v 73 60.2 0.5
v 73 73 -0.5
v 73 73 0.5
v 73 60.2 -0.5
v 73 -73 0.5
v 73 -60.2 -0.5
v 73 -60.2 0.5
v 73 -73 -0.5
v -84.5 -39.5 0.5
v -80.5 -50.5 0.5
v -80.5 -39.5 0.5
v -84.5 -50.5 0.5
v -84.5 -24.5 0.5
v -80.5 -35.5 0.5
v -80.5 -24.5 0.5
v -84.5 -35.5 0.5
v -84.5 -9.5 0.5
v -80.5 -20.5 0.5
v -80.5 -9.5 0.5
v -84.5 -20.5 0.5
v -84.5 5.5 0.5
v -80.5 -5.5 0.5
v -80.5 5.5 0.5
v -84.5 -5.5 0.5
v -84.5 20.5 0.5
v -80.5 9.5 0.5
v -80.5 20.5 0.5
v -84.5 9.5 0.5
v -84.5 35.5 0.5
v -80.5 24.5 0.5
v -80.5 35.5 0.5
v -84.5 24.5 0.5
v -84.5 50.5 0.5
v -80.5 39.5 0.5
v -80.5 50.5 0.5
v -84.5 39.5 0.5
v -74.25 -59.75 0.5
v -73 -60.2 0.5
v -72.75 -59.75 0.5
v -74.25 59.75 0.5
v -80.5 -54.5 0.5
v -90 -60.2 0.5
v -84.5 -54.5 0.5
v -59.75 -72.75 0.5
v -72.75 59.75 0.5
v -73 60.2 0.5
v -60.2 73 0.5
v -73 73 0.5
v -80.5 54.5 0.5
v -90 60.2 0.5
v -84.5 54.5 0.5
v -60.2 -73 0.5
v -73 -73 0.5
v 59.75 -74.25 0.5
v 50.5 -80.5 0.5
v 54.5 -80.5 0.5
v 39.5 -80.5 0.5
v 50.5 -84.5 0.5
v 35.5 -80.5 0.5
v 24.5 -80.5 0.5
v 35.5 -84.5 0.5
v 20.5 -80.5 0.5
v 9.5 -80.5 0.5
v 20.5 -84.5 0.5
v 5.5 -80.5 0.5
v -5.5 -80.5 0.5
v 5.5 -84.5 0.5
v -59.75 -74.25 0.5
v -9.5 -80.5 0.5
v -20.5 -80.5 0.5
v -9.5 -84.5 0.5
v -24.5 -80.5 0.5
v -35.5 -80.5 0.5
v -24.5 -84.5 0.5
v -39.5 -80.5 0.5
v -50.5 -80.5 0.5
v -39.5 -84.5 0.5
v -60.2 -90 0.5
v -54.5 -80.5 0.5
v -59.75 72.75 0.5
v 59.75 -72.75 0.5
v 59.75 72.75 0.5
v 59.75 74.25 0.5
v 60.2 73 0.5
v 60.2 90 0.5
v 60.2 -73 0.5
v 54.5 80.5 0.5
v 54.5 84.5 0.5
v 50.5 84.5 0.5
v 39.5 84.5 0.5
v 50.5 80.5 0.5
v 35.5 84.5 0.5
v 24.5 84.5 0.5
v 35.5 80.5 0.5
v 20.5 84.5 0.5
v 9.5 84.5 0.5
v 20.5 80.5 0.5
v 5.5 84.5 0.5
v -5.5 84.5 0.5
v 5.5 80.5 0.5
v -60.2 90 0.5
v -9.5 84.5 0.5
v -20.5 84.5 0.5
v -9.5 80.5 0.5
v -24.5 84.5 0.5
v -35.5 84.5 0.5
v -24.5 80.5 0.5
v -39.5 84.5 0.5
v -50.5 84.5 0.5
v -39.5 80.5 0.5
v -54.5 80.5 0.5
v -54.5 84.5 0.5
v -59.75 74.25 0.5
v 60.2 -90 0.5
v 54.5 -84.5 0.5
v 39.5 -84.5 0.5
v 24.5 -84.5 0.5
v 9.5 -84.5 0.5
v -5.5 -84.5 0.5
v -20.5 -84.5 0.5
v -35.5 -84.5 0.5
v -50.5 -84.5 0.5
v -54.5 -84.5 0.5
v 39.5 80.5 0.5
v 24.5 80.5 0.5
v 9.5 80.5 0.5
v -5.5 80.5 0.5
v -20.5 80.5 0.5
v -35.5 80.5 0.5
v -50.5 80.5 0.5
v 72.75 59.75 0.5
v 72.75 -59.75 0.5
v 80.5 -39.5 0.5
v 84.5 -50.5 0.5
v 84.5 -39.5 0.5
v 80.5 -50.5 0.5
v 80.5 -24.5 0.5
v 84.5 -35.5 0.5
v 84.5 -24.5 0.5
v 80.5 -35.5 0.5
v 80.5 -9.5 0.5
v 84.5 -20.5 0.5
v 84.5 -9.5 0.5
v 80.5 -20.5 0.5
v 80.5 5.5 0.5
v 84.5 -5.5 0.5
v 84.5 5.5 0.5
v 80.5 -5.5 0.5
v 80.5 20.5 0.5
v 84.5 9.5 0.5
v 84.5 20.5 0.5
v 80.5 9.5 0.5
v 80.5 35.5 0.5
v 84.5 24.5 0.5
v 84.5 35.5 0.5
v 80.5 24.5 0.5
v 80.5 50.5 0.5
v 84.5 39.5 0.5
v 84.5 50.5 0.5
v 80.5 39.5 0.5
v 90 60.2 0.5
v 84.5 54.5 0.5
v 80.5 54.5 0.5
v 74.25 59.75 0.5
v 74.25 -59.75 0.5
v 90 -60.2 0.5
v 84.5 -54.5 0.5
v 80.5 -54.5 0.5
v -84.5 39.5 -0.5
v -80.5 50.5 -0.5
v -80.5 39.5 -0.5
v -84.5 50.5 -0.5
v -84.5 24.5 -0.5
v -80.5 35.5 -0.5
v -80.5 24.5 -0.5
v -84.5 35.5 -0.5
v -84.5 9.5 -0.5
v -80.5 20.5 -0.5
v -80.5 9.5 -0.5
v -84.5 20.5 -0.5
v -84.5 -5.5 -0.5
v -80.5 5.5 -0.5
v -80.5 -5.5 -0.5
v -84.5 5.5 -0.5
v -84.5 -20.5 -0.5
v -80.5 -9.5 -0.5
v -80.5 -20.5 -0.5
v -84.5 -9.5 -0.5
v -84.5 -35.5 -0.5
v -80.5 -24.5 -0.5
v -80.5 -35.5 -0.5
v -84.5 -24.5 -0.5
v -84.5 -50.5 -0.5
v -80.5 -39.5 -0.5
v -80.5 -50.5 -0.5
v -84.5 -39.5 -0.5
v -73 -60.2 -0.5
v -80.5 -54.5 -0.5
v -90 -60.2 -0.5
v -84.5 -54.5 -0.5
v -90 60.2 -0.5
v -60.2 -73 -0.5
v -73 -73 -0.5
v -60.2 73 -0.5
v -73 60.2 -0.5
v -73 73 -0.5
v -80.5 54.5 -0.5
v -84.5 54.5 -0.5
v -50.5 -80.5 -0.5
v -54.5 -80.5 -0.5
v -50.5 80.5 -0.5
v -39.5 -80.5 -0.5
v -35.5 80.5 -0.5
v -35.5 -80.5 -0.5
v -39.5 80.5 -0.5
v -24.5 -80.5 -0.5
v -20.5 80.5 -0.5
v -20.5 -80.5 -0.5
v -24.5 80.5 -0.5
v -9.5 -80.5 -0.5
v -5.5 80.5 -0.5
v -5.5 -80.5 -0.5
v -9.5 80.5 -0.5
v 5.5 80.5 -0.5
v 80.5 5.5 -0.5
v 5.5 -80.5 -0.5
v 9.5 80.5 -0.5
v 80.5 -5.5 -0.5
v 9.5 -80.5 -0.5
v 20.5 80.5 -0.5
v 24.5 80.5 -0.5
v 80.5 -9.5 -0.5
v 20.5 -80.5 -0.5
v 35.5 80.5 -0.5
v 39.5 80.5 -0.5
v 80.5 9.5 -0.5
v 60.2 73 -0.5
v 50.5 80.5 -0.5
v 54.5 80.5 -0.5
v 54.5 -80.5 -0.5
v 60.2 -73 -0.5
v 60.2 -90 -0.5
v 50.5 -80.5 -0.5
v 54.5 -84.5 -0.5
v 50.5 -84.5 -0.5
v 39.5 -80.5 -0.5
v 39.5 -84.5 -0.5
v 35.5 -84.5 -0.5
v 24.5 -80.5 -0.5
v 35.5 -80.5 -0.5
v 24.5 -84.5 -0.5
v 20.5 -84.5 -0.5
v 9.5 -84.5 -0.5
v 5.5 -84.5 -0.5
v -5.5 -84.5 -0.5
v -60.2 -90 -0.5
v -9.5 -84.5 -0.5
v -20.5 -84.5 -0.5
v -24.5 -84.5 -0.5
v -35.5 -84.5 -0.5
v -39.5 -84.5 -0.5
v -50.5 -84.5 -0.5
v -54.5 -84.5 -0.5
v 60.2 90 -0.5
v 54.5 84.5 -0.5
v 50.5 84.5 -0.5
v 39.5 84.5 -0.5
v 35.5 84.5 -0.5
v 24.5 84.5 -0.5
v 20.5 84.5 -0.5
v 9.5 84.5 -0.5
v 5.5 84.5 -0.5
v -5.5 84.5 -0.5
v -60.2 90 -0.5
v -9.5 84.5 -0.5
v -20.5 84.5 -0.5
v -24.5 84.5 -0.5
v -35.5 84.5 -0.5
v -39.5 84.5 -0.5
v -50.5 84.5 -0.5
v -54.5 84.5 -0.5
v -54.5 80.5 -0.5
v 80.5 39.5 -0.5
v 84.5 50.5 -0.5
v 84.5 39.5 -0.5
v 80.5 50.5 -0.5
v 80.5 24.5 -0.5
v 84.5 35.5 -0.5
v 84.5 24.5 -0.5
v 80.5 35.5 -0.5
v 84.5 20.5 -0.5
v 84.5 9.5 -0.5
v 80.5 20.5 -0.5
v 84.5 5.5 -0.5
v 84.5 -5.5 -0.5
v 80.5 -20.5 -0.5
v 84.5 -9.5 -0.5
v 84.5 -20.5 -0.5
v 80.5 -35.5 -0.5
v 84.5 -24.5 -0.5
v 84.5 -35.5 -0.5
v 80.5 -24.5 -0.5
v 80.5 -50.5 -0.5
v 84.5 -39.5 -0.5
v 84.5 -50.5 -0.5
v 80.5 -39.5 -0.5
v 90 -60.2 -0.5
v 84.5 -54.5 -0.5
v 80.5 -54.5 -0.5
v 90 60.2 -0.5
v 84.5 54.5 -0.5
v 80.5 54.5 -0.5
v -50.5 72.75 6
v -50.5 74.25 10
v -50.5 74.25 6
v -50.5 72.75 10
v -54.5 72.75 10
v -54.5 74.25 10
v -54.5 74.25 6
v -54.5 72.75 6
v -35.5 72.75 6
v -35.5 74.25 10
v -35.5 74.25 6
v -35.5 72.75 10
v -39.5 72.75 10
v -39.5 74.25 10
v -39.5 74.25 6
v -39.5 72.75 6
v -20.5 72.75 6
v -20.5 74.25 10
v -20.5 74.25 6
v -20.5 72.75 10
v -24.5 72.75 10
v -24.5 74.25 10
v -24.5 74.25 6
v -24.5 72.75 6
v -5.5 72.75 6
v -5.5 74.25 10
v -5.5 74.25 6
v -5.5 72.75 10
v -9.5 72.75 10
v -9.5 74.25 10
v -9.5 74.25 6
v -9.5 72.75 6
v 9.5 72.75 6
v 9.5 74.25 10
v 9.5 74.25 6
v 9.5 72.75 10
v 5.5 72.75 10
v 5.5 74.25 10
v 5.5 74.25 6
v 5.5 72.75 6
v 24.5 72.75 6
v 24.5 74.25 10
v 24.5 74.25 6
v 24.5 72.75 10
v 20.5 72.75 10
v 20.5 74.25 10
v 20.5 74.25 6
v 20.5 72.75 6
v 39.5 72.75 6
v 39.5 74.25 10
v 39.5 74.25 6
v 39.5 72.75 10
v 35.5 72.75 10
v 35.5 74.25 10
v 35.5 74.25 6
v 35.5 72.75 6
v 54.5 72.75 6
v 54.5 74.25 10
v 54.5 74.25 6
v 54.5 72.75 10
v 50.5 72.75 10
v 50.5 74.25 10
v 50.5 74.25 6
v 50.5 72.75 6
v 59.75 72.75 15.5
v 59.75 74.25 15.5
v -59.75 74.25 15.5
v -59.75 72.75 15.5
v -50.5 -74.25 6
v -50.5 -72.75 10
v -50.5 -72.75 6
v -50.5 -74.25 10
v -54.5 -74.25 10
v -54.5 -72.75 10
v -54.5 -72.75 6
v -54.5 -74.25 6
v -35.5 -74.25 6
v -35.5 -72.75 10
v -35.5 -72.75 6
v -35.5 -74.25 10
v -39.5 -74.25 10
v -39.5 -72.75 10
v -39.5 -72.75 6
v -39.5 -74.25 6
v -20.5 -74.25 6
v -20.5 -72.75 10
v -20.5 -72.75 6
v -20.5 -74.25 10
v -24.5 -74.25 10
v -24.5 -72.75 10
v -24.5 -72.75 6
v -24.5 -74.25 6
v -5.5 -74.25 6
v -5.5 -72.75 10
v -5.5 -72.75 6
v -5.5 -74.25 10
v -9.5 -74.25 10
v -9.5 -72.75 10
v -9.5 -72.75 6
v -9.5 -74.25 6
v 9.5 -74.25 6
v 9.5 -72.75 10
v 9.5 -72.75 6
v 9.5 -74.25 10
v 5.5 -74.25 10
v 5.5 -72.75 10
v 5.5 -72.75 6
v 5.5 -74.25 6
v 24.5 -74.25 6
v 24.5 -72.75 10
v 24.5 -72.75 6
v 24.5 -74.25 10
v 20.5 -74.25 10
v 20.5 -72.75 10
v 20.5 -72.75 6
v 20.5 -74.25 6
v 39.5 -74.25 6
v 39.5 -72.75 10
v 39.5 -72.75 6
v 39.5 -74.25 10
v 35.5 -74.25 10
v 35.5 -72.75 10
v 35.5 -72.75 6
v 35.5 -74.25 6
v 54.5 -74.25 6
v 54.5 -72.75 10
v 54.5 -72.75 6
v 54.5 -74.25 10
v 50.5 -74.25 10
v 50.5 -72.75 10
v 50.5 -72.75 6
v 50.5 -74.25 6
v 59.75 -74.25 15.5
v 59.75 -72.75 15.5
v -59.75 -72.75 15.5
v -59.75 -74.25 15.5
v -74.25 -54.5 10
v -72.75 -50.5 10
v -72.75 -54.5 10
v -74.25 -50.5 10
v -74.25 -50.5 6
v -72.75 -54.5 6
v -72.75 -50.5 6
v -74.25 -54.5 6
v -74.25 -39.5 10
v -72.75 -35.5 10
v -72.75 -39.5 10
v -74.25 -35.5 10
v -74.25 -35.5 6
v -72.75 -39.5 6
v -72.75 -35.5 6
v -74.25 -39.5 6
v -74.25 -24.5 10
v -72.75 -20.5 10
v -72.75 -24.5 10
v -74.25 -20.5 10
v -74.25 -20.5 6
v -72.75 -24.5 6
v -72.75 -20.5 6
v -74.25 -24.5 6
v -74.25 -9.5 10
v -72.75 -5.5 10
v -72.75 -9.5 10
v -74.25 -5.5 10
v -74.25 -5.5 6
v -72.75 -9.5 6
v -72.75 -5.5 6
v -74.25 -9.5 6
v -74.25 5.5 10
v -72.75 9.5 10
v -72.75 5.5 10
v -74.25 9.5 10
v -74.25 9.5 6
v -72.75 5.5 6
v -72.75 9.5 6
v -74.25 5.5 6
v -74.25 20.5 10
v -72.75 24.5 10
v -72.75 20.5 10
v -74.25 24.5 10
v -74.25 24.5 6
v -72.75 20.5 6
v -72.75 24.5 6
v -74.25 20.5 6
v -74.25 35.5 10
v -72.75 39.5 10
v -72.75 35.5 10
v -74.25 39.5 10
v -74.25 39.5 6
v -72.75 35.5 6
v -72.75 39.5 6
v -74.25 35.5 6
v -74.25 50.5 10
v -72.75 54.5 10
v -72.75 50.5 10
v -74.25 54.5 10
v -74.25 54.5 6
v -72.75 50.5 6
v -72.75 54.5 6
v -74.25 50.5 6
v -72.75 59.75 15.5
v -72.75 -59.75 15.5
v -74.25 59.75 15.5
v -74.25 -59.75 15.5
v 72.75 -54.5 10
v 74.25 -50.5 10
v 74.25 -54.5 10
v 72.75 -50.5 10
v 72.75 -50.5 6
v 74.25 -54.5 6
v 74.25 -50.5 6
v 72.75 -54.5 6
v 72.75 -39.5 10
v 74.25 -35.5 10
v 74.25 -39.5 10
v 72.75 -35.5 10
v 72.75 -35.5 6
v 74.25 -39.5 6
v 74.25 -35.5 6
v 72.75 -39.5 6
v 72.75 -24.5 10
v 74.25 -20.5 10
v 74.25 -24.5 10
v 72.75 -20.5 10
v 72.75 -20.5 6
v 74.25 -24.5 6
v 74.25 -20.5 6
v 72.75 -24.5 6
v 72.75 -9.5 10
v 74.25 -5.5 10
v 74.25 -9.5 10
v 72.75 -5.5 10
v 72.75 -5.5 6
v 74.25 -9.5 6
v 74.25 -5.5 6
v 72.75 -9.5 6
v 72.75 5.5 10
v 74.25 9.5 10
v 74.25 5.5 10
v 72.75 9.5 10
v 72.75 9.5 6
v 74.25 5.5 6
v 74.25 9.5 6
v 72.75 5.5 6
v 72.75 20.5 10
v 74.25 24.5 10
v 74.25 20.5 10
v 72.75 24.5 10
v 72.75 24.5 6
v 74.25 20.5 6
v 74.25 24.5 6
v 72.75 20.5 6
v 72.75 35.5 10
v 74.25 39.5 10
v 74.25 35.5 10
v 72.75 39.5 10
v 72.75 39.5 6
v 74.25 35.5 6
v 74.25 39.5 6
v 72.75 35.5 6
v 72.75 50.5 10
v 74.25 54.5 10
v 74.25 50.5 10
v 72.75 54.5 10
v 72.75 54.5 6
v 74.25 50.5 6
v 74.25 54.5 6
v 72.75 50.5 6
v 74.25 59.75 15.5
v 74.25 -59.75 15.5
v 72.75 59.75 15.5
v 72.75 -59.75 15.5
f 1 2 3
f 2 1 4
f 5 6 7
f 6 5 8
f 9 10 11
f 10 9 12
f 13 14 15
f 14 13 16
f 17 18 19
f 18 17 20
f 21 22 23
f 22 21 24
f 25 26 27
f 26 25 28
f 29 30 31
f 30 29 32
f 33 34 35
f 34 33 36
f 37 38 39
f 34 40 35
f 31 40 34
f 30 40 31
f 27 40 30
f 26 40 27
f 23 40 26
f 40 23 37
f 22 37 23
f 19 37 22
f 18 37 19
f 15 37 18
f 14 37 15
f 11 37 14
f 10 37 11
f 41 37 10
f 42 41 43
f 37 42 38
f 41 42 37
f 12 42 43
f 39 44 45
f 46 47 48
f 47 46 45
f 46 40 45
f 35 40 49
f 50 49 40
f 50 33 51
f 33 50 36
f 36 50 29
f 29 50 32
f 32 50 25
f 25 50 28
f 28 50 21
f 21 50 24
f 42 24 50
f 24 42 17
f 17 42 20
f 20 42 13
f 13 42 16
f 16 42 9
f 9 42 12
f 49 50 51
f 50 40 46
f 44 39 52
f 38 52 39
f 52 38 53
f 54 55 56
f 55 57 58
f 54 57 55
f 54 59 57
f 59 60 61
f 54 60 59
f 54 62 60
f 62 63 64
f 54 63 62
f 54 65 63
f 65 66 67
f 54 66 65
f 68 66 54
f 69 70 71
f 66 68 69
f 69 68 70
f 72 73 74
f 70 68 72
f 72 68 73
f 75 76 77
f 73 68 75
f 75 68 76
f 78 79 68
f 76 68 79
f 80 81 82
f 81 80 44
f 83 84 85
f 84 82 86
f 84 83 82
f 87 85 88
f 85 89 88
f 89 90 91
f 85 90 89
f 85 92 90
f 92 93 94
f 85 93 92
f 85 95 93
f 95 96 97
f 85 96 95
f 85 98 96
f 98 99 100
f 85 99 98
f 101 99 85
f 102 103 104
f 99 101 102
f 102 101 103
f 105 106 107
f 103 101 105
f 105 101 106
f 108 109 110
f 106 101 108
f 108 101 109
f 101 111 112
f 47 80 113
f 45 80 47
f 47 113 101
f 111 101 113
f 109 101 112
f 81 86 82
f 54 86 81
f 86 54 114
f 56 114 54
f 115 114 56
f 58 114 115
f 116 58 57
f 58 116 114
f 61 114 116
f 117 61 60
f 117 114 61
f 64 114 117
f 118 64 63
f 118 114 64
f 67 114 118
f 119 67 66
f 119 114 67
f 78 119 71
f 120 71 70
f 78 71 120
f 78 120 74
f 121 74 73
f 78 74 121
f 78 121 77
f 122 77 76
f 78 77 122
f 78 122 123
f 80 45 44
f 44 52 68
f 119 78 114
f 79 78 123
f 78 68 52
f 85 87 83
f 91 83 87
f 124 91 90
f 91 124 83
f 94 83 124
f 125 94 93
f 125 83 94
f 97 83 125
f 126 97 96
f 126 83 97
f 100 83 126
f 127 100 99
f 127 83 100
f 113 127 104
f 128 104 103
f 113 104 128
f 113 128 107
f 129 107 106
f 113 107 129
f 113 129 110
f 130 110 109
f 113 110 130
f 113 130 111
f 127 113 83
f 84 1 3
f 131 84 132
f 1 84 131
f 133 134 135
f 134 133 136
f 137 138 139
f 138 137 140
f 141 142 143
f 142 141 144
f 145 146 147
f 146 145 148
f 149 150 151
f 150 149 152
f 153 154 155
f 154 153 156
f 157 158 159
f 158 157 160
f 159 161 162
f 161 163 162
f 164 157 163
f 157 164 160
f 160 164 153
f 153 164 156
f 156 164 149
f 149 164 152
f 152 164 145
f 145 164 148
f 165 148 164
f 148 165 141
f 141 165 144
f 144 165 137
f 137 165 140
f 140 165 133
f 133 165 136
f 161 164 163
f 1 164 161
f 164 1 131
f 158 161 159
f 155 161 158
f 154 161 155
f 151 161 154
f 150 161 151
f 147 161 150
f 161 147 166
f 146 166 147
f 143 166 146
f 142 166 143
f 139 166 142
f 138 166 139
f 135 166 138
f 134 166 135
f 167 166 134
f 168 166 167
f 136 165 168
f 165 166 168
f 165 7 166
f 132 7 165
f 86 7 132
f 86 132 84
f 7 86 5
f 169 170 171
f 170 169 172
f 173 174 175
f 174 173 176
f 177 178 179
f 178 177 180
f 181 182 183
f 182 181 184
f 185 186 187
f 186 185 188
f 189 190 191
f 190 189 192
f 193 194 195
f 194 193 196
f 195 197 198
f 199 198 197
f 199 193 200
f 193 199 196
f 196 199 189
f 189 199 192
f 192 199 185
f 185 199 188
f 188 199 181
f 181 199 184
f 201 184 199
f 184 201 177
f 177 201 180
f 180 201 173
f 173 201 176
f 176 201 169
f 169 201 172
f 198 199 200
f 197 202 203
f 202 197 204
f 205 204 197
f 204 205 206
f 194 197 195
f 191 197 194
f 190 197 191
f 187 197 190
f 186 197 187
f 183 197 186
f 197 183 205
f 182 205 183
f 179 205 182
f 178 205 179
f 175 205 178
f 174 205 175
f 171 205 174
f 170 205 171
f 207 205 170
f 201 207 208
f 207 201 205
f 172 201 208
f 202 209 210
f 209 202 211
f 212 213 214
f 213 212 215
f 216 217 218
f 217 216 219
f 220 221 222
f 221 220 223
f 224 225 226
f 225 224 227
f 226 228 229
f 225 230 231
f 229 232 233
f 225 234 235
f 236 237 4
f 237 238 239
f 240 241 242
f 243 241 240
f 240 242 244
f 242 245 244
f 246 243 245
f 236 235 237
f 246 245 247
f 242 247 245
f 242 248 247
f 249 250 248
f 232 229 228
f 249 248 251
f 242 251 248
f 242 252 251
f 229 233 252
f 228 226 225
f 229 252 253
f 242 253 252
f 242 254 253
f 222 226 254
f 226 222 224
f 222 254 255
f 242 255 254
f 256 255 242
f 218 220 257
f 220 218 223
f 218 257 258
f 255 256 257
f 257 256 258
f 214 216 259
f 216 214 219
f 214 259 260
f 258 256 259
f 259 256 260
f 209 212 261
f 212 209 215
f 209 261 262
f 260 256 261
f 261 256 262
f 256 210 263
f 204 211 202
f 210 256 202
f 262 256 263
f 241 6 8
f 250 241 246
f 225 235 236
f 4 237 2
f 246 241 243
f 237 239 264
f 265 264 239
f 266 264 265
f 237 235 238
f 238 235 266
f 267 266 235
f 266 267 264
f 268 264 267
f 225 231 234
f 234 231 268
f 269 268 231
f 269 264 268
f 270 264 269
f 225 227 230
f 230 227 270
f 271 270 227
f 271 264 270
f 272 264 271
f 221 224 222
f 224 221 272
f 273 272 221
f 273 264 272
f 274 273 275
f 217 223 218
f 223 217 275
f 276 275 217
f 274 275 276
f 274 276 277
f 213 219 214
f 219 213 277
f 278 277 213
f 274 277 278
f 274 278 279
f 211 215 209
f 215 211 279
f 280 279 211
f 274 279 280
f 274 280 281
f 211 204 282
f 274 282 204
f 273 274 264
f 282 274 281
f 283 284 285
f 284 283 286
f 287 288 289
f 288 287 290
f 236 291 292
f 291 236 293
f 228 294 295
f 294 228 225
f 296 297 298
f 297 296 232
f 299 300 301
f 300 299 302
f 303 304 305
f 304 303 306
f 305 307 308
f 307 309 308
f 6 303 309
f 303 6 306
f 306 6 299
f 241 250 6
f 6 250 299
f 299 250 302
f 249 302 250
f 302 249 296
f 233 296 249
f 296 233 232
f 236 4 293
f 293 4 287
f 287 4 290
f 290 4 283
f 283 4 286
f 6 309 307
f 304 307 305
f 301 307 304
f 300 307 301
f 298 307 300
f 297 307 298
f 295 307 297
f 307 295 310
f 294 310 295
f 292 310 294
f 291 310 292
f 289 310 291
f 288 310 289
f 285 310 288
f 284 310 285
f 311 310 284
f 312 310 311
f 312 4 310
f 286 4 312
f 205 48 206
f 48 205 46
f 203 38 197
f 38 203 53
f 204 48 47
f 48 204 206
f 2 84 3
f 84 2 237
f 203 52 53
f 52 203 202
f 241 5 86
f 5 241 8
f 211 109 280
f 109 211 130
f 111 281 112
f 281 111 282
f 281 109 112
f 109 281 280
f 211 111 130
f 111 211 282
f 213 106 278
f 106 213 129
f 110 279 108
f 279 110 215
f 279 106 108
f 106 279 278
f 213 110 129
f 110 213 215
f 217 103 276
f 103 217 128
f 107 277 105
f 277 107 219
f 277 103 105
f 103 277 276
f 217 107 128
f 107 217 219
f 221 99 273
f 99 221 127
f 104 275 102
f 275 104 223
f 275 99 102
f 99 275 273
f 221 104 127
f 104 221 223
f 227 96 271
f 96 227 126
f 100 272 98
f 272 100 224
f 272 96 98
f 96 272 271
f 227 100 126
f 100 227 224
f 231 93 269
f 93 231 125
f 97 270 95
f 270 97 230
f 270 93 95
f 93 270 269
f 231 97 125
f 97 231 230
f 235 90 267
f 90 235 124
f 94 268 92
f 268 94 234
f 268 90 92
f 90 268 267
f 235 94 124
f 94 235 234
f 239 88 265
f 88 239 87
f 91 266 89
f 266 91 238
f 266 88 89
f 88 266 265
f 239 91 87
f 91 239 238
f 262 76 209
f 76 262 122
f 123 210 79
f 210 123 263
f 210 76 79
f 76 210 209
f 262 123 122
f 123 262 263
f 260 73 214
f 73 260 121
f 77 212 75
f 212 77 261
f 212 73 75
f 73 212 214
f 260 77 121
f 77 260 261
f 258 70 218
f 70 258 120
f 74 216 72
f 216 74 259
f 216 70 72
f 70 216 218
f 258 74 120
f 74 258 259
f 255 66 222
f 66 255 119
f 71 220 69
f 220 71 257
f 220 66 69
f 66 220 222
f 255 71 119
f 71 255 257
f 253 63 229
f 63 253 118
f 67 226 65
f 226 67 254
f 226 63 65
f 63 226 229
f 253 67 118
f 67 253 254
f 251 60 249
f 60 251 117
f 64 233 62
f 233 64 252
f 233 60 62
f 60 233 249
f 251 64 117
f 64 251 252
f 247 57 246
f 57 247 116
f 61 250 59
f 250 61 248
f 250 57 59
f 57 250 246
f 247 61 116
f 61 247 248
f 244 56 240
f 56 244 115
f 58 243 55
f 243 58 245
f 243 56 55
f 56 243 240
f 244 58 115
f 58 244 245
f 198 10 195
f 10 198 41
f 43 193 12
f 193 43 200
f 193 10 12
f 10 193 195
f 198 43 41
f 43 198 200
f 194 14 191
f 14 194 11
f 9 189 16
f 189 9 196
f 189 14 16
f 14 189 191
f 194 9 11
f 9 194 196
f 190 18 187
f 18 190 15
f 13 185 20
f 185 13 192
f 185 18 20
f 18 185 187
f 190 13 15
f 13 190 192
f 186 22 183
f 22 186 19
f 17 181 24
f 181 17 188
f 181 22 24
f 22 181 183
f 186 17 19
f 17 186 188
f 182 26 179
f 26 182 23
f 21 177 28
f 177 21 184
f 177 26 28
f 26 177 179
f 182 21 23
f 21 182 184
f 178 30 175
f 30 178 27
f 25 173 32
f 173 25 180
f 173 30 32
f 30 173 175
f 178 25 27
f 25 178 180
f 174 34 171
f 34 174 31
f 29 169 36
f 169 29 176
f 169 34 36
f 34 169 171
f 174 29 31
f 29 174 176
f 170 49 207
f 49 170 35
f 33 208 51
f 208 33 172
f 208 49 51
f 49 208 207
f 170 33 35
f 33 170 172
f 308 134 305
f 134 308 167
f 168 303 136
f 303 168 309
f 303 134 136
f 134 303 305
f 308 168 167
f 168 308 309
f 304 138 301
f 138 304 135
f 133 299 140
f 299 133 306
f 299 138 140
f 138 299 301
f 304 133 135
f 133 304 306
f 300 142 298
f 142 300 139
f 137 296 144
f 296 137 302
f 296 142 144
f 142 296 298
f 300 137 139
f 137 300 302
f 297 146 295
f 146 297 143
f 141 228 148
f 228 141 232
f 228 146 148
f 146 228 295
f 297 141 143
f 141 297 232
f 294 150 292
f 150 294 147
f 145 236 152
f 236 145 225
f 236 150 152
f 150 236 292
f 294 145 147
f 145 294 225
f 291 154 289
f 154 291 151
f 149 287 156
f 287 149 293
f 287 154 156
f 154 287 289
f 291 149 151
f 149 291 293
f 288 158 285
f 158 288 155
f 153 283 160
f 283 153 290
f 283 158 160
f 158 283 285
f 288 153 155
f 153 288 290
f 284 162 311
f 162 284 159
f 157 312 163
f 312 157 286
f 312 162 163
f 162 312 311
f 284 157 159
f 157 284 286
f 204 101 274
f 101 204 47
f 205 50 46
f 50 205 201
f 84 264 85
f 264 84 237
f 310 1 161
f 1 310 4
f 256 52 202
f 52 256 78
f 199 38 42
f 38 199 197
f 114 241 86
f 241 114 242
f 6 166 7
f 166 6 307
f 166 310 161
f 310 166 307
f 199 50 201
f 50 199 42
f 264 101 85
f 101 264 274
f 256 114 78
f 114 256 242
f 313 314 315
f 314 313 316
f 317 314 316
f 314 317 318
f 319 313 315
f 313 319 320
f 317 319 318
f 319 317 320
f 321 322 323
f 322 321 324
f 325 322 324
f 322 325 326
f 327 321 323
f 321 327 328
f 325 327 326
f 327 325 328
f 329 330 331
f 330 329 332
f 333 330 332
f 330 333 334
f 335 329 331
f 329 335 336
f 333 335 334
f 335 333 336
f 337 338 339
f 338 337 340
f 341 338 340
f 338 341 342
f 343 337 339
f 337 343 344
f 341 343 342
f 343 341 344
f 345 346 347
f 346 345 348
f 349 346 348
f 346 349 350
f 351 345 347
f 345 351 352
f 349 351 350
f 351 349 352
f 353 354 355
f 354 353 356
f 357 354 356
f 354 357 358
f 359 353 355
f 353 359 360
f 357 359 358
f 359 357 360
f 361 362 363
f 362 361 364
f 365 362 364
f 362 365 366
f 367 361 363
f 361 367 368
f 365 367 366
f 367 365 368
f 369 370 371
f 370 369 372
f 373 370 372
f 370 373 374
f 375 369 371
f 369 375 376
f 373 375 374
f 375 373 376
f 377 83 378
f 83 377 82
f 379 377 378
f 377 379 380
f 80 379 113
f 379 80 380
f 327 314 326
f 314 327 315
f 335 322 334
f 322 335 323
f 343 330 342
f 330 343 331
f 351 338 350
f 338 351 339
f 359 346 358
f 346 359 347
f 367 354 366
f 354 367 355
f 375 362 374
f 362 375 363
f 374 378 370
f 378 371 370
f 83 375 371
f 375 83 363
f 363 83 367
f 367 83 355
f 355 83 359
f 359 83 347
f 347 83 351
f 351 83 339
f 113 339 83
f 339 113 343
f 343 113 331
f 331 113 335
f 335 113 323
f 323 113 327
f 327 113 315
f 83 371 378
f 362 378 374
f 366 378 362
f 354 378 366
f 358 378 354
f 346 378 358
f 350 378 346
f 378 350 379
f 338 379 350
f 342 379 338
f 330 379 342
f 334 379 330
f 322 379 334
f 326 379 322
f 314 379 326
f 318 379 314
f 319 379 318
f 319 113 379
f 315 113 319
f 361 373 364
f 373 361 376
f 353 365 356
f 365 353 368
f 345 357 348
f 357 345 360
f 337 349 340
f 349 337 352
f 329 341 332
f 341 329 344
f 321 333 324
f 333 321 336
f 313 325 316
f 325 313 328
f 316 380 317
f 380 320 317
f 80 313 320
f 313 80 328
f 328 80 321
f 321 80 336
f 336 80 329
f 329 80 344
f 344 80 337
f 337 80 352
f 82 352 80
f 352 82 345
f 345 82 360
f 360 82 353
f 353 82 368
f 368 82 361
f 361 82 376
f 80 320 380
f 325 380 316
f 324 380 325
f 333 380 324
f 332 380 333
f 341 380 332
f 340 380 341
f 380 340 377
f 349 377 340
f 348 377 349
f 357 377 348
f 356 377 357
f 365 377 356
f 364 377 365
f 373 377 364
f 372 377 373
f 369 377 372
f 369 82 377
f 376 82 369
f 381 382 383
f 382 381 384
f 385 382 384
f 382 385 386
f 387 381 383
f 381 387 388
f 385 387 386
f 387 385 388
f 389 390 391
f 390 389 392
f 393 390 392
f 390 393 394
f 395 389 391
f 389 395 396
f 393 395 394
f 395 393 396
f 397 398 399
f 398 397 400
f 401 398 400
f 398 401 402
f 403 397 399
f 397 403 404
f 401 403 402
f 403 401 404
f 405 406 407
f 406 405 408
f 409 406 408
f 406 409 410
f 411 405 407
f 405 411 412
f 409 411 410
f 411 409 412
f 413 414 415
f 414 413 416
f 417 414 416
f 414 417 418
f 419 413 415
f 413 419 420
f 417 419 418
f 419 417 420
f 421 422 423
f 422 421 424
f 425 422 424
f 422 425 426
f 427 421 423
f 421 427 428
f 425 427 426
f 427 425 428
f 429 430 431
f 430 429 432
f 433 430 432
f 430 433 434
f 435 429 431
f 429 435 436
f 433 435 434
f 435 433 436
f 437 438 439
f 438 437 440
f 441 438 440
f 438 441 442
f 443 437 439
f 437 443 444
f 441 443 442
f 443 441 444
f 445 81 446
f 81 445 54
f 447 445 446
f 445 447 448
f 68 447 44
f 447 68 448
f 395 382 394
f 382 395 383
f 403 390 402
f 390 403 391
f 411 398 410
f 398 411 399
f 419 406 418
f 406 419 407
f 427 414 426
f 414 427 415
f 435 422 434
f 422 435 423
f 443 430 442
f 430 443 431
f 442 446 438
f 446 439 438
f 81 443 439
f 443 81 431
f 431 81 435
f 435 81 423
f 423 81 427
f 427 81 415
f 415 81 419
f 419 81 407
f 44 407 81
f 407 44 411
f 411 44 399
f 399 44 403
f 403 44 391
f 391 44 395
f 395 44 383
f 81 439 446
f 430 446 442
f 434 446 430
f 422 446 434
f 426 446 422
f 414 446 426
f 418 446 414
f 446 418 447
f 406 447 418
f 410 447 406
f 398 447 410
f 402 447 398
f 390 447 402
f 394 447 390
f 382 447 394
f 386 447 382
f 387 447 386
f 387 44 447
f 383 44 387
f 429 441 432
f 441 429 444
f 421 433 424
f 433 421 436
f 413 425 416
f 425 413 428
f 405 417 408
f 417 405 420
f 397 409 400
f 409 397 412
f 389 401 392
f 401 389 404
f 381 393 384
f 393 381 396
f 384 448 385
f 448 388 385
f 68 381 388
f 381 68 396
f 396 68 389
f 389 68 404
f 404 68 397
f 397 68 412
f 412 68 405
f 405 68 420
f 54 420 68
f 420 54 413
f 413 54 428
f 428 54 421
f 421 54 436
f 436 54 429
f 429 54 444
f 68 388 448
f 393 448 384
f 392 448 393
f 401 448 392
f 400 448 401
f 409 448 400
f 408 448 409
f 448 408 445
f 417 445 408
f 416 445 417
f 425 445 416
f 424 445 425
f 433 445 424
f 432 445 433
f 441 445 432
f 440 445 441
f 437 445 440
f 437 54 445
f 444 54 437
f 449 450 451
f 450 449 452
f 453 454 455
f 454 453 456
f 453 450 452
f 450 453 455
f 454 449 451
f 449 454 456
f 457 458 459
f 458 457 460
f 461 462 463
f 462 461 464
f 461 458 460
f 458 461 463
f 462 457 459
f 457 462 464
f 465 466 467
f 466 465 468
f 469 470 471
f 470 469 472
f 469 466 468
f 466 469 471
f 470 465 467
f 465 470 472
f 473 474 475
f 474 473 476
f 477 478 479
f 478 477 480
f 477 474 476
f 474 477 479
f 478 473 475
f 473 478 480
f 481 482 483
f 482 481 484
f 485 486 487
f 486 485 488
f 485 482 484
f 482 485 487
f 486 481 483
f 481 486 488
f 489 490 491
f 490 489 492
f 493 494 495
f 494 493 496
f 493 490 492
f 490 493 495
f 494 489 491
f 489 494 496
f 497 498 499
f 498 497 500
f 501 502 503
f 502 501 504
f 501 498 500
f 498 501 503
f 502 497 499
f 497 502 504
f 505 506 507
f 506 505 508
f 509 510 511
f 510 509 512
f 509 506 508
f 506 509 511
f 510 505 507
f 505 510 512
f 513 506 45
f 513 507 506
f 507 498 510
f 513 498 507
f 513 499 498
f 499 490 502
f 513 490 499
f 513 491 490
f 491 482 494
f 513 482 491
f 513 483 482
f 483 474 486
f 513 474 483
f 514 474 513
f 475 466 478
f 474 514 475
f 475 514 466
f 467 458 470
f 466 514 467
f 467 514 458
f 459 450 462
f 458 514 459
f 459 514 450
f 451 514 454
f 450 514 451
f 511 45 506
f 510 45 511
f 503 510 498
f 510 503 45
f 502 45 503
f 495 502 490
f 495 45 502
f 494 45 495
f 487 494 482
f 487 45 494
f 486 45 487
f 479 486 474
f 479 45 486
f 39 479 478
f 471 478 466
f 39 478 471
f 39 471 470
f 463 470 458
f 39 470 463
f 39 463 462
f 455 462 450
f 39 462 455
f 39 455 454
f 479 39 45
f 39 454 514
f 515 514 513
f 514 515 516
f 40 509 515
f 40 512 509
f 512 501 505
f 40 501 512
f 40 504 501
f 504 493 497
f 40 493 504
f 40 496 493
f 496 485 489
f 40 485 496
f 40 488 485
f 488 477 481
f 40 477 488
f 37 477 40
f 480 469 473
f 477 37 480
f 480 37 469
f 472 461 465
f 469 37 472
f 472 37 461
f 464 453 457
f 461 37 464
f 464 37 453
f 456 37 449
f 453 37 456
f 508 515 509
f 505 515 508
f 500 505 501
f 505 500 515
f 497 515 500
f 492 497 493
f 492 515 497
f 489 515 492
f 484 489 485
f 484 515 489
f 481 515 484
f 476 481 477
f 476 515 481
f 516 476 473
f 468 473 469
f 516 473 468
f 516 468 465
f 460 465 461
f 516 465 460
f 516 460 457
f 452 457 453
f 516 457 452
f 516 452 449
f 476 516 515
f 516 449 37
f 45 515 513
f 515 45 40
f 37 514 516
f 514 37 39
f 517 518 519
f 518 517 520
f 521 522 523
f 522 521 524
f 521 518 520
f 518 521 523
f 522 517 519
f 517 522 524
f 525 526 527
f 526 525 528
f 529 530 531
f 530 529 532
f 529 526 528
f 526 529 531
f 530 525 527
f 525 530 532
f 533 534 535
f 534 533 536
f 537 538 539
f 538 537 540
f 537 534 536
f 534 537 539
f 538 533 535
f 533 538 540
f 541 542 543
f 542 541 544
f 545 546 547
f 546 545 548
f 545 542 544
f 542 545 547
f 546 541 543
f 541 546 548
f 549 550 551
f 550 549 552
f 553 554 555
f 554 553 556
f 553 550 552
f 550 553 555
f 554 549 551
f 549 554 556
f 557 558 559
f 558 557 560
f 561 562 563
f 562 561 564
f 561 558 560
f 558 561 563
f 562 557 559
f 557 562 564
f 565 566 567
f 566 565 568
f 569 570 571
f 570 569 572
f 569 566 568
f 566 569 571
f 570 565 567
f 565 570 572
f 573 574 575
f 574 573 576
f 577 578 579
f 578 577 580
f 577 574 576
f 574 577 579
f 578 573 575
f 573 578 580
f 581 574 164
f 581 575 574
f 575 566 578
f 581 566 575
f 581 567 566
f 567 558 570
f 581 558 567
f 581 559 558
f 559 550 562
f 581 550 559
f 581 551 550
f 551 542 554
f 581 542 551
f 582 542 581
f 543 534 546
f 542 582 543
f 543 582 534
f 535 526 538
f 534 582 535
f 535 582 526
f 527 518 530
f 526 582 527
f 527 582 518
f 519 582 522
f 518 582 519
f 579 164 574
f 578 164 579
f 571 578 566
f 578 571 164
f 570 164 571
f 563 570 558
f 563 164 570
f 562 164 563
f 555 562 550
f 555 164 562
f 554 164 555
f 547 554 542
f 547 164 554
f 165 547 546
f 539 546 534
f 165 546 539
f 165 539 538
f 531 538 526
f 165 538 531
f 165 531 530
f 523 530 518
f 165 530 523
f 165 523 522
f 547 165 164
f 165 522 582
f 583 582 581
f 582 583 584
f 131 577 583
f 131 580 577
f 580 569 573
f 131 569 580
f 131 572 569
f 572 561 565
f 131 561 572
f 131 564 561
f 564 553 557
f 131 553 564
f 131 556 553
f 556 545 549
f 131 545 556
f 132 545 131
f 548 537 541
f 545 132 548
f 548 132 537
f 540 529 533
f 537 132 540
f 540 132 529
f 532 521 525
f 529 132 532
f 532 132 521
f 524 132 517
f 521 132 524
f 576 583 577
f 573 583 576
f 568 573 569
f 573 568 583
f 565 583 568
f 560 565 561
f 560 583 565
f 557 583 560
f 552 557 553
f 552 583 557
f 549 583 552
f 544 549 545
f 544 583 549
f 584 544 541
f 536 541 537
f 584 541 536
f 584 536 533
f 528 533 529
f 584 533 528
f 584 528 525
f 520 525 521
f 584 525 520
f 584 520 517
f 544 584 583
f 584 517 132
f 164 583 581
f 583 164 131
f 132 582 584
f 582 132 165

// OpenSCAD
////////////////////////////////////////
// HomeRacker Plates – v1.4 - Jan 25rd, 2026
////////////////////////////////////////

/* [Parameters] */
//Qty of HomeRacker Units
blocks_X = 12;
//Qty of HomeRacker Units
blocks_Y = 12;
//Ideally no less then 1mm or it tends to just snap.
thickness = 1;
shape_color = "#ffffff";
//This toggle enables debug text to determine which side is which. (Top, Bottom, Left, Right) This does add a significant amount of time to the generate the model.
show_debug_sides = false;
debug_color = "#ff0000";
//This shows debug blocks that allows you to see what you are cutting off of the flaps.
cutout_guides=false;

/* [Hole Toggles] */
hole_top = true;
hole_bottom = true;
hole_left = true;
hole_right = true;

/* [Ears Settings] */
ear_top = true;
ear_bottom = true;
ear_left = true;
ear_right = true;
//Ideally no less then 1mm or it tends to just snap.
ear_thickness = 1.5;

/* [Interlaced Ears] */
// Removes every other ear to allow for interlacing
interlaced_ears_top = false;
interlaced_ears_bottom = false;
interlaced_ears_left = false;
interlaced_ears_right = false;
//Interlaced Ears Size in HomeRacker Units (2 Units works out the best)
interlaced_ears_size = 2;
enable_ears_margins = false;
//Margin in millimetres - Do not excced -2.0mm - This value removes from the left and right of each flap to allow for slight variations on prints.
interlaced_ears_margin = -0.1; 

/* [Connector Corner Cutouts] */
//Cuts out the corner 30mm to allow for snug fit with connectors
Corner_Top_Left = true;
Corner_Top_Right = true;
Corner_Bottom_Left = true;
Corner_Bottom_Right = true;
//This adjusts the overlap tolerance on all corners. 
overlap_tolerance=.2;


/* [Remove flaps] */
//Removes flaps on the side that contains the holes for top based mounting.
flap_top = false;
flap_bottom = false;
flap_left = false;
flap_right = false;

/* [Interlaced Flaps] */
//Removes every other flap to allow for interlacing
interlaced_flaps_top = false;
interlaced_flaps_bottom = false;
interlaced_flaps_left = false;
interlaced_flaps_right = false;
// Interlaced Flaps Size in HomeRacker Units (2 Units works out the best)
interlaced_flaps_size = 2;
enable_flaps_margin = false;
// Margin in millimetres - Do not excced -2.0mm - This value removes from the left and right of each flap to allow for slight variations on prints.
interlaced_flaps_margin = -0.1; 

/* [Top Cutouts] */
//Enables or disables a cutout box.
cutout_top_1_enabled = false;//Top Cutouts
//Size of Cutout in HomeRacker Units
cutout_top_1_size = 1; // [1, 2, 3, 4, 5, 6, 7, 8, 9, 10, 11, 12, 13, 14, 15, 16, 17, 18, 19, 20]
//Starting position from Left to Right in HomeRacker Units.
cutout_top_1_start_position = 0; // [0, 1, 2, 3, 4, 5, 6, 7, 8, 9, 10, 11, 12, 13, 14, 15, 16, 17, 18, 19, 20]
//Enables or disables a cutout box.
cutout_top_2_enabled = false;
//Size of Cutout in HomeRacker Units
cutout_top_2_size = 1; // [1, 2, 3, 4, 5, 6, 7, 8, 9, 10, 11, 12, 13, 14, 15, 16, 17, 18, 19, 20]
//Starting position from Left to Right in HomeRacker Units.
cutout_top_2_start_position = 0; // [0, 1, 2, 3, 4, 5, 6, 7, 8, 9, 10, 11, 12, 13, 14, 15, 16, 17, 18, 19, 20]

/* [Bottom Cutouts] */
//Enables or disables a cutout box.
cutout_bottom_1_enabled = false;//Top Cutouts
//Size of Cutout in HomeRacker Units
cutout_bottom_1_size = 1; // [1, 2, 3, 4, 5, 6, 7, 8, 9, 10, 11, 12, 13, 14, 15, 16, 17, 18, 19, 20]
//Starting position from Left to Right in HomeRacker Units.
cutout_bottom_1_start_position = 0; // [0, 1, 2, 3, 4, 5, 6, 7, 8, 9, 10, 11, 12, 13, 14, 15, 16, 17, 18, 19, 20]
//Enables or disables a cutout box.
cutout_bottom_2_enabled = false;
//Size of Cutout in HomeRacker Units
cutout_bottom_2_size = 1; // [1, 2, 3, 4, 5, 6, 7, 8, 9, 10, 11, 12, 13, 14, 15, 16, 17, 18, 19, 20]
//Starting position from Left to Right in HomeRacker Units.
cutout_bottom_2_start_position = 0; // [0, 1, 2, 3, 4, 5, 6, 7, 8, 9, 10, 11, 12, 13, 14, 15, 16, 17, 18, 19, 20]

/* [Left Cutouts] */
//Enables or disables a cutout box.
cutout_left_1_enabled = false;//Top Cutouts
//Size of Cutout in HomeRacker Units
cutout_left_1_size = 1; // [1, 2, 3, 4, 5, 6, 7, 8, 9, 10, 11, 12, 13, 14, 15, 16, 17, 18, 19, 20]
//Starting position from Top to Bottom in HomeRacker Units.
cutout_left_1_start_position = 1; // [0, 1, 2, 3, 4, 5, 6, 7, 8, 9, 10, 11, 12, 13, 14, 15, 16, 17, 18, 19, 20]
//Enables or disables a cutout box.
cutout_left_2_enabled = false;
//Size of Cutout in HomeRacker Units
cutout_left_2_size = 1; // [1, 2, 3, 4, 5, 6, 7, 8, 9, 10, 11, 12, 13, 14, 15, 16, 17, 18, 19, 20]
//Starting position from Top to Bottom in HomeRacker Units.
cutout_left_2_start_position = 0; // [0, 1, 2, 3, 4, 5, 6, 7, 8, 9, 10, 11, 12, 13, 14, 15, 16, 17, 18, 19, 20]

/* [Right Cutouts] */
//Enables or disables a cutout box.
cutout_right_1_enabled = false;//Top Cutouts
//Size of Cutout in HomeRacker Units
cutout_right_1_size = 1; // [1, 2, 3, 4, 5, 6, 7, 8, 9, 10, 11, 12, 13, 14, 15, 16, 17, 18, 19, 20]
//Starting position from Top to Bottom in HomeRacker Units.
cutout_right_1_start_position = 0; // [0, 1, 2, 3, 4, 5, 6, 7, 8, 9, 10, 11, 12, 13, 14, 15, 16, 17, 18, 19, 20]
//Enables or disables a cutout box.
cutout_right_2_enabled = false;
//Size of Cutout in HomeRacker Units
cutout_right_2_size = 1; // [1, 2, 3, 4, 5, 6, 7, 8, 9, 10, 11, 12, 13, 14, 15, 16, 17, 18, 19, 20]
//Starting position from Top to Bottom in HomeRacker Units.
cutout_right_2_start_position = 0; // [0, 1, 2, 3, 4, 5, 6, 7, 8, 9, 10, 11, 12, 13, 14, 15, 16, 17, 18, 19, 20]
/* [Fan Openings / Fan Cutouts - *Experimental*] */
enable_fan_holes = false;
//Fan size in mm
fan_size = 120; // [120,140,180]
fan_hole_screw_size = 3.5;
fan_grill_pattern = "Circle Hole"; //["Circle Hole","Hexagon"]
//Displayed in millimeters.
fan_grill_hexagon_size = 5;
//Displayed in millimeters.
fan_grill_hexagon_spacing = 1;
//Displayed in millimeters.
fan_grill_hexagon_length = 100;
//Displayed in millimeters.
fan_grill_hexagon_height = 100;
//Displayed in millimeters.
fan_grill_circle_diameter = 57;

/* [SVG Embed - *Experimental*] */
//I have not tested this much, use at your own risk!
enable_SVG = false;
filenameSVG = "default.svg";
SVG_Color = "#000000";

/* [Hidden] */
Unit_Size = 15;
Hole_Size = 4;
Edge_Offset = 5.5;
Hole_Spacing = 11; 
Corner_Size = 30;
Margin = 0;
Centered = true;

//Number of Home Racker Units
left_top_x_user = 2;
left_top_y_user = 2;
right_top_x_user = 2;
right_top_y_user = 2;
left_bottom_x_user = 2;
left_bottom_y_user = 2;
right_bottom_x_user = 2;
right_bottom_y_user = 2;

width = Unit_Size * blocks_X;
height = Unit_Size * blocks_Y;

x_shift = Centered ? -width/2 : 0;
y_shift = Centered ? -height/2 : 0;
z_shift = Centered ? -thickness/2 : 0;

margin_ear = enable_ears_margins ? interlaced_ears_margin : 0;

//Debug Settings
Debug_Font_Color = "#ff0000";
Debug_Font_Family = "Liberation Sans";
Debug_Font_LE = 4;
Debug_Top_XYZ = [x_shift/2 + 35, -y_shift + 15, 0];
Debug_Bottom_XYZ = [x_shift/2 + 20, y_shift - 25, 0];
Debug_Left_XYZ = [x_shift - width/2, y_shift + height/2, 0];
Debug_Right_XYZ = [-x_shift + 30, y_shift + height/2, 0];
Debug_Message1_XYZ = [x_shift*2 + width/2, y_shift - 55, 0];
Debug_Message2_XYZ = [x_shift*2 + width/2 - 30, y_shift - 75, 0];
    
Debug_Top_Text = "TOP";
Debug_Bottom_Text = "BOTTOM";
Debug_Left_Text = "LEFT";
Debug_Right_Text = "RIGHT";
Debug_Message1_Text = "Debug mode 'Show Debug Sides' is enabled";
Debug_Message2_Text = "Ensure you disable before saving or printing this file.";

//Basic elements for creation
module hole(lwh = [Hole_Size,Hole_Size,Hole_Size], xyz) {
    if (is_undef(xyz)) {
    cube([lwh[0], lwh[1], lwh[2]], center = false);
    }
    else {
    translate([xyz[0], xyz[1], xyz[2] + thickness])
        cube([lwh[0], lwh[1], lwh[2]], center = false);
    }
}
module fan_hole(x, y, z, radius, height, centered = false)
{
    translate([x,y,z])
        cylinder(h=height, r=radius, center=centered);
}
module block(x, y, z, block_x, block_y, block_z, block_color = "#ffffff",debug = false) {
    color(block_color)
        translate([x, y, z])
            if(debug) #cube([block_x, block_y, block_z], center = false);
            else cube([block_x, block_y, block_z], center = false);
            
}
module hex(r) {
    polygon(points = [
        [ r, 0 ],
        [ r/2,  r*sqrt(3)/2 ],
        [ -r/2, r*sqrt(3)/2 ],
        [ -r, 0 ],
        [ -r/2, -r*sqrt(3)/2 ],
        [ r/2, -r*sqrt(3)/2 ]
    ]);
}

//Creation Modules
module create_hex_grid(area_width, area_height, hex_radius, spacing=0, center=[0,0,0], thickness=10) {

    hex_width  = sqrt(3) * hex_radius;
    hex_height = 2 * hex_radius;

    x_step = hex_width + spacing;
    y_step = hex_height * 0.75 + spacing;

    cols = ceil(area_width / x_step) + 2;
    rows = ceil(area_height / y_step) + 2;

    intersection() {
        translate([-area_width/2, -area_height/2, -4])
            linear_extrude(height = 10)
                square([area_width, area_height]);
        for (row = [0:rows-1]) {
            y = row * y_step - area_height/2;
            for (col = [0:cols-1]) {
                x = col * x_step
                    + (row % 2) * (x_step / 2)
                    - area_width/2;

                translate([x, y, -4])
                    rotate(90)
                        linear_extrude(height = thickness*2)
                            hex(hex_radius);
            }
        }
    }
}
module create_debug_text(xyz,txt,txt_color=Debug_Font_Color,le=Debug_Font_LE,font=Debug_Font_Family)
{
    color(txt_color)
        linear_extrude(le)
            translate(xyz)
                text(txt, font = font);
}
module create_cutout(
    cutout_enabled = false,
    cutout_top_start_pos,
    cutout_size = 0,
    cutout_xyz = [0,0,0],
    blocks_xyz = [0,0,0]
) {
    if (cutout_enabled) {   
        X = cutout_xyz[0];
        Y = cutout_xyz[1];
        Z = cutout_xyz[2];
        Block_X = blocks_xyz[0];
        Block_Y = blocks_xyz[1];
        Block_Z = blocks_xyz[2];
        if(cutout_guides){
            block(X,Y,Z, Block_X, Block_Y, Block_Z, debug_color, true);
        }
        difference() {
            block(X,Y,Z, Block_X, Block_Y, Block_Z);
        }
    }
}
module create_ear(ear_enabled,ear_xyz,ear_wlh,ear_center = true,blocks,hole_lwh,hole_xyz_fn,   interlaced_ear,ie_xyz_fn,ie_lwh) {
    if (ear_enabled) {
        difference() {
            color(shape_color)
                translate(ear_xyz)
                    cube(ear_wlh, center = ear_center);

            // Holes
            for (i = [0 : blocks - 1]) {
                hole(
                    lwh = hole_lwh,
                    xyz = hole_xyz_fn(i)
                );
            }

            // Interlaced ears
            if (interlaced_ear) {
                for (i = [0 : blocks / 2]) {
                    if (i % interlaced_ears_size == 0) {
                        translate(ie_xyz_fn(i))
                            cube(ie_lwh);
                    }
                }
            }
        }
    }
}

//Option checks
module check_fan_holes()
{
    if (enable_fan_holes == true)
    {
        half_fan_hole = fan_hole_screw_size*2;
        if(fan_grill_pattern == "Circle Hole") {fan_hole(0, 0, 0, fan_grill_circle_diameter, thickness*2, true);}
        else if(fan_grill_pattern == "Hexagon") {create_hex_grid(fan_grill_hexagon_length, fan_grill_hexagon_height,       fan_grill_hexagon_size,spacing=fan_grill_hexagon_spacing, center=[0,0,0], thickness=10);}

        if(fan_size == 120 || fan_size == 140 || fan_size == 180)
        {   
            if (blocks_X < 10 || blocks_Y < 10){create_debug_text(xyz=[x_shift/2 + 20, y_shift - 25, 0],txt="ERROR");}
            if (blocks_X >= 10 && blocks_Y >= 10)
            {
            // Screw holes
            fan_hole((fan_size/2) - half_fan_hole,  (fan_size/2) - half_fan_hole, 0, fan_hole_screw_size, thickness*2, true);
            fan_hole(-(fan_size/2) + half_fan_hole,  (fan_size/2) - half_fan_hole, 0, fan_hole_screw_size, thickness*2, true);
            fan_hole((fan_size/2) - half_fan_hole, -(fan_size/2) + half_fan_hole, 0, fan_hole_screw_size, thickness*2, true);
            fan_hole(-(fan_size/2) + half_fan_hole, -(fan_size/2) + half_fan_hole, 0, fan_hole_screw_size, thickness*2, true);
            }
        }

    }
}
module check_interlaced_flaps()
{
    margin = enable_flaps_margin ? interlaced_flaps_margin : 0;

    if(interlaced_flaps_left) {  
        for (i = [0 : blocks_Y/2 - 1]) {
            translate([x_shift, y_shift + ((Unit_Size * interlaced_flaps_size * i)*2) + margin/2, -(Unit_Size * interlaced_flaps_size /2 - thickness)])
                cube([Unit_Size + ear_thickness, (Unit_Size * interlaced_flaps_size) - margin, Unit_Size]);
        }
    }
if(interlaced_flaps_right) {  
    for (i = [0 : blocks_Y/2 - 1]) {
        mirror([1,0,0])   
            translate([x_shift, y_shift + Unit_Size * interlaced_flaps_size + ((Unit_Size * interlaced_flaps_size * i)*2) + margin/2, -(Unit_Size * interlaced_flaps_size /2 - thickness)])
            cube([Unit_Size + ear_thickness, (Unit_Size * interlaced_flaps_size) - margin, Unit_Size]);
    }
}
if(interlaced_flaps_top) {  
    for (i = [0 : blocks_X/2 - 1]) {
        mirror([0,1,0])   
            translate([x_shift + Unit_Size * interlaced_flaps_size + ((Unit_Size * interlaced_flaps_size * i)*2) + margin/2, y_shift, -(Unit_Size * interlaced_flaps_size/2 - thickness)])
                cube([(Unit_Size * interlaced_flaps_size) - margin, Unit_Size + ear_thickness, Unit_Size]);
    }
}
if(interlaced_flaps_bottom) {  
    for (i = [0 : blocks_X/2 - 1]) {
        translate([x_shift + ((Unit_Size * interlaced_flaps_size * i)*2) + margin/2, y_shift, -(Unit_Size * interlaced_flaps_size /2 - thickness)])
            cube([(Unit_Size * interlaced_flaps_size) - margin, Unit_Size + ear_thickness, Unit_Size]);
    }
}

}

module check_cutouts()
{
    //Cutout - Top - 1
    create_cutout(
        cutout_top_1_enabled, 
        cutout_top_1_start_position,
        cutout_top_1_size,
        [x_shift + cutout_top_1_start_position * Unit_Size,-y_shift - Unit_Size - (ear_thickness/2),thickness/2 -thickness],
        [Unit_Size * cutout_top_1_size, Unit_Size + (ear_thickness/2), Unit_Size + thickness]
    );
   
    //Cutout - Top - 2
    create_cutout(
        cutout_top_2_enabled,
        cutout_top_2_start_position,
        cutout_top_2_size,
        [x_shift + cutout_top_2_start_position * Unit_Size,-y_shift - Unit_Size - (ear_thickness/2),thickness/2 -thickness],
        [Unit_Size * cutout_top_2_size, Unit_Size + (ear_thickness/2), Unit_Size + thickness]
    );
    
    //Cutout - Bottom - 1
    create_cutout(
        cutout_bottom_1_enabled,
        cutout_bottom_1_start_position,
        cutout_bottom_1_size,
        [x_shift + cutout_bottom_1_start_position * Unit_Size,y_shift,-thickness],
        [Unit_Size * cutout_bottom_1_size, Unit_Size + (ear_thickness/2), Unit_Size + thickness]
    );
    //Cutout - Bottom - 2
    create_cutout(
        cutout_bottom_2_enabled,
        cutout_bottom_2_start_position,
        cutout_bottom_2_size,
        [x_shift + cutout_bottom_2_start_position * Unit_Size,y_shift,-thickness],
        [Unit_Size * cutout_bottom_2_size, Unit_Size + (ear_thickness/2), Unit_Size + thickness]
    );
    
    //Cutout - Left - 1
    create_cutout(
        cutout_left_1_enabled,
        cutout_left_1_start_position,
        cutout_left_1_size,
        [x_shift,-y_shift - cutout_left_1_start_position - (Unit_Size * cutout_left_1_size),-thickness],
        [Unit_Size + (ear_thickness/2),Unit_Size * cutout_left_1_size, Unit_Size + thickness]
    );
    //Cutout - Left - 2
    create_cutout(
        cutout_left_2_enabled,
        cutout_left_2_start_position,
        cutout_left_2_size,
        [x_shift,-y_shift - cutout_left_2_start_position - (Unit_Size * cutout_left_2_size),-thickness],
        [Unit_Size + (ear_thickness/2),Unit_Size * cutout_left_2_size, Unit_Size + thickness]
    );
    //Cutout - Right - 1
    create_cutout(
        cutout_right_1_enabled,
        cutout_right_1_start_position,
        cutout_right_1_size,
        [-x_shift - Unit_Size - (ear_thickness/2),-y_shift - cutout_right_1_start_position - (Unit_Size * cutout_right_1_size),-thickness],
        [Unit_Size + (ear_thickness/2),Unit_Size * cutout_right_1_size, Unit_Size + thickness]
    );

    //Cutout - Right - 2
    create_cutout(
        cutout_right_2_enabled,
        cutout_right_2_start_position,
        cutout_right_2_size,
        [-x_shift - Unit_Size - (ear_thickness/2),-y_shift - cutout_right_2_start_position - (Unit_Size * cutout_right_2_size),-thickness],
        [Unit_Size + (ear_thickness/2),Unit_Size * cutout_right_2_size, Unit_Size + thickness]
    );
    
}
module check_debug()
{
    if(show_debug_sides)
    {
        create_debug_text(xyz=Debug_Top_XYZ,txt=Debug_Top_Text);
        create_debug_text(xyz=Debug_Bottom_XYZ,txt=Debug_Bottom_Text);
        create_debug_text(xyz=Debug_Left_XYZ,txt=Debug_Left_Text);
        create_debug_text(xyz=Debug_Right_XYZ,txt=Debug_Right_Text);
        create_debug_text(xyz=Debug_Message1_XYZ,txt=Debug_Message1_Text);
        create_debug_text(xyz=Debug_Message2_XYZ,txt=Debug_Message2_Text);
    }
}
module check_cut_corners()
{
        if(Corner_Top_Left) {
            translate([x_shift - Corner_Size - overlap_tolerance * 2 , -y_shift - Corner_Size + overlap_tolerance, z_shift - thickness/2])
                cube([Corner_Size * 2 + overlap_tolerance , Corner_Size * 2 + overlap_tolerance, thickness * 4 + Unit_Size]);
        }
        if(Corner_Top_Right) {
            translate([-x_shift - Corner_Size + overlap_tolerance, -y_shift - Corner_Size + overlap_tolerance, z_shift - thickness/2])
                cube([Corner_Size * 2 + overlap_tolerance, Corner_Size * 2 + overlap_tolerance, thickness * 4 + Unit_Size]);
        }
        if(Corner_Bottom_Left) {
            translate([x_shift - Corner_Size - overlap_tolerance * 2, y_shift - Corner_Size - overlap_tolerance * 2, z_shift - thickness/2])
                cube([Corner_Size * 2 + overlap_tolerance, Corner_Size * 2 + overlap_tolerance, thickness * 4 + Unit_Size]);
        }
        if(Corner_Bottom_Right) {
            translate([-x_shift - Corner_Size + overlap_tolerance, y_shift - Corner_Size - overlap_tolerance * 2, z_shift - thickness/2])
                cube([Corner_Size * 2 + overlap_tolerance, Corner_Size * 2 + overlap_tolerance, thickness * 4 + Unit_Size]);
        }
}
module check_flaps()
{
        if(flap_top)
              translate([x_shift, -y_shift - Unit_Size - ear_thickness/2, z_shift - thickness])
                cube([width, Unit_Size + thickness, thickness + 4]); 
        if(flap_bottom)
            translate([x_shift, y_shift - .2, z_shift - thickness])
                cube([width, Unit_Size + thickness, thickness + 4]);
        if(flap_left)
            translate([x_shift - .2, y_shift, z_shift - thickness])
                cube([Unit_Size + thickness, height, thickness + 4]);
        if(flap_right)
            translate([-x_shift - Unit_Size - ear_thickness/2, y_shift, z_shift - thickness])
                cube([Unit_Size + thickness, height, thickness + 4]);
}
module check_holes() {
        if (hole_top) {
            for (i = [0 : blocks_X - 1]) {
                hole(lwh = [Hole_Size, Hole_Size, Hole_Size * thickness],
                xyz = [x_shift + Edge_Offset + i * (Hole_Spacing + Hole_Size),
                (y_shift + height) - Edge_Offset - Hole_Size,
                z_shift-thickness-.1]);
            }
        }
        if (hole_bottom) {
            for (i = [0 : blocks_X - 1]) {
                hole(lwh = [Hole_Size, Hole_Size, Hole_Size * thickness],
                xyz = [x_shift + Edge_Offset + i * (Hole_Spacing + Hole_Size),
                (y_shift) + Edge_Offset,
                z_shift-thickness-.1]);
            }
        }
        if (hole_left) {
            for (i = [0 : blocks_Y - 1]) {
                hole(lwh = [Hole_Size, Hole_Size, Hole_Size * thickness],
                xyz = [(x_shift) + Edge_Offset,
                y_shift + Edge_Offset + i * (Hole_Spacing + Hole_Size),
                z_shift-thickness-.1]);
            }
        }
        if (hole_right) {
            for (i = [0 : blocks_Y - 1]) {
                hole(lwh = [Hole_Size, Hole_Size, Hole_Size * thickness],
                xyz = [(-x_shift) - Edge_Offset - Hole_Size,
                y_shift + Edge_Offset + i * (Hole_Spacing + Hole_Size),
                z_shift-thickness-.1]);
            }
        }
}
module check_ears()
{
// Ear Top
create_ear(
    ear_enabled = ear_top,
    ear_xyz = [0, -y_shift - Unit_Size - ear_thickness, Unit_Size / 2],
    ear_wlh = [width - 30.5 - Corner_Size, ear_thickness, 15 + thickness],
    blocks = blocks_X,
    hole_lwh = [Hole_Size, Hole_Size + ear_thickness, Hole_Size],
    hole_xyz_fn = function(i)
        [
            x_shift + Edge_Offset + i * (Hole_Spacing + Hole_Size),
            (y_shift + height) - Unit_Size - ear_thickness * 2,
            z_shift + Edge_Offset
        ],
    interlaced_ear = interlaced_ears_top,
    ie_xyz_fn = function(i)
        [
            x_shift + (Unit_Size * interlaced_ears_size) * (i + 1) + margin_ear / 2,
            -((y_shift + Unit_Size) + ear_thickness * 2),
            z_shift + thickness
        ],
    ie_lwh = [
        (Unit_Size * interlaced_ears_size) - margin_ear,
        Unit_Size + ear_thickness,
        Unit_Size + thickness
    ]
);

//Ear Bottom
create_ear(
    ear_enabled = ear_bottom,
    ear_xyz = [0, y_shift + Unit_Size + ear_thickness, Unit_Size / 2],
    ear_wlh = [width - 30.5 - Corner_Size, ear_thickness, 15 + thickness],
    blocks = blocks_X,
    hole_lwh = [Hole_Size, Hole_Size + ear_thickness, Hole_Size],
    hole_xyz_fn = function(i)
        [
            x_shift + Edge_Offset + i * (Hole_Spacing + Hole_Size),
            -((y_shift + height) - Unit_Size),
            z_shift + Edge_Offset
        ],
    interlaced_ear = interlaced_ears_bottom,
    ie_xyz_fn = function(i)
        [
            x_shift + (Unit_Size * interlaced_ears_size) * i + margin_ear / 2,
            -((y_shift + height) - Unit_Size),
            z_shift + thickness
        ],
    ie_lwh = [
        (Unit_Size * interlaced_ears_size) - margin_ear,
        Unit_Size + ear_thickness,
        Unit_Size + thickness
    ]
);

//Ear Left
create_ear(
    ear_enabled = ear_left,
    ear_xyz = [x_shift + Unit_Size + ear_thickness, 0, Unit_Size/2],
    ear_wlh = [ear_thickness, height - 30.5 - Corner_Size, 15 + thickness],
    blocks = blocks_Y,
    hole_lwh = [Hole_Size + ear_thickness, Hole_Size, Hole_Size],
    hole_xyz_fn = function(i)
        [
            x_shift + Unit_Size + ear_thickness / 2 - 1,
            y_shift + Edge_Offset + i * (Hole_Spacing + Hole_Size),
            z_shift + Edge_Offset
        ],
    interlaced_ear = interlaced_ears_left,
    ie_xyz_fn = function(i)
        [
            x_shift + Unit_Size + ear_thickness -1,
            y_shift + (Unit_Size * interlaced_ears_size) * i + margin_ear / 2,
            z_shift + ear_thickness /2
        ],
    ie_lwh = [
        ear_thickness + Unit_Size,
        (Unit_Size * interlaced_ears_size) - margin_ear,
        Unit_Size + thickness
    ]
);

//Ear Right
create_ear(
    ear_enabled = ear_right,
    ear_xyz = [-x_shift - Unit_Size - ear_thickness, 0, Unit_Size/2],
    ear_wlh = [ear_thickness, height - 30.5 - Corner_Size, 15 + thickness],
    blocks = blocks_Y,
    hole_lwh = [Hole_Size + ear_thickness, Hole_Size, Hole_Size],
    hole_xyz_fn = function(i)
        [
            -x_shift - Unit_Size - ear_thickness * 2,
            y_shift + Edge_Offset + i * (Hole_Spacing + Hole_Size),
            z_shift + Edge_Offset
        ],
    interlaced_ear = interlaced_ears_right,
    ie_xyz_fn = function(i)
        [
            -x_shift - Unit_Size - ear_thickness * 2,
            y_shift + Unit_Size * interlaced_ears_size * (i + 1) + margin_ear / 2,
            z_shift + thickness - thickness/2
        ],
    ie_lwh = [
        ear_thickness + Unit_Size,
        (Unit_Size * interlaced_ears_size) - margin_ear,
        Unit_Size + thickness 
    ]
);

   
}
//TODO: Add more options to SVG Embed.
module svg_embed(scale_factor = 1, height = 1, x = 0, y = 0, z = 0) {
    color(SVG_Color)
    rotate(a=[0,180,180])
    translate([x, y, z])
        linear_extrude(height = height, center = true)
            scale(scale_factor)
                import(filenameSVG, center = true);
}
module render_final() {

    if (enable_SVG) {svg_embed(scale_factor = .25, height = .2, x = 0, y = 0, z = .4); }
    
    //Base Plate Core
    //This renders and creates the core cube that is used for everything inbetween the ears.
    color(shape_color)
        difference() {
        cube([width-34, height-34, thickness], center = true); 
           check_fan_holes();   
        }
            difference() {
                //This cube is overlayed into the core but expands to the the edge of the panel becoming the flaps.
                //Might change the way this is done but it works fine for now.
                color(shape_color)
                    translate([x_shift, y_shift, z_shift])
                        cube([width, height, thickness], center = false);

                        check_holes();
                        check_fan_holes();
                        check_flaps();
                        check_cut_corners();
                        check_cutouts();
                        check_interlaced_flaps();
                        
            }
            
            check_ears();
            check_debug();
}
//Run that bad boi
render_final();
